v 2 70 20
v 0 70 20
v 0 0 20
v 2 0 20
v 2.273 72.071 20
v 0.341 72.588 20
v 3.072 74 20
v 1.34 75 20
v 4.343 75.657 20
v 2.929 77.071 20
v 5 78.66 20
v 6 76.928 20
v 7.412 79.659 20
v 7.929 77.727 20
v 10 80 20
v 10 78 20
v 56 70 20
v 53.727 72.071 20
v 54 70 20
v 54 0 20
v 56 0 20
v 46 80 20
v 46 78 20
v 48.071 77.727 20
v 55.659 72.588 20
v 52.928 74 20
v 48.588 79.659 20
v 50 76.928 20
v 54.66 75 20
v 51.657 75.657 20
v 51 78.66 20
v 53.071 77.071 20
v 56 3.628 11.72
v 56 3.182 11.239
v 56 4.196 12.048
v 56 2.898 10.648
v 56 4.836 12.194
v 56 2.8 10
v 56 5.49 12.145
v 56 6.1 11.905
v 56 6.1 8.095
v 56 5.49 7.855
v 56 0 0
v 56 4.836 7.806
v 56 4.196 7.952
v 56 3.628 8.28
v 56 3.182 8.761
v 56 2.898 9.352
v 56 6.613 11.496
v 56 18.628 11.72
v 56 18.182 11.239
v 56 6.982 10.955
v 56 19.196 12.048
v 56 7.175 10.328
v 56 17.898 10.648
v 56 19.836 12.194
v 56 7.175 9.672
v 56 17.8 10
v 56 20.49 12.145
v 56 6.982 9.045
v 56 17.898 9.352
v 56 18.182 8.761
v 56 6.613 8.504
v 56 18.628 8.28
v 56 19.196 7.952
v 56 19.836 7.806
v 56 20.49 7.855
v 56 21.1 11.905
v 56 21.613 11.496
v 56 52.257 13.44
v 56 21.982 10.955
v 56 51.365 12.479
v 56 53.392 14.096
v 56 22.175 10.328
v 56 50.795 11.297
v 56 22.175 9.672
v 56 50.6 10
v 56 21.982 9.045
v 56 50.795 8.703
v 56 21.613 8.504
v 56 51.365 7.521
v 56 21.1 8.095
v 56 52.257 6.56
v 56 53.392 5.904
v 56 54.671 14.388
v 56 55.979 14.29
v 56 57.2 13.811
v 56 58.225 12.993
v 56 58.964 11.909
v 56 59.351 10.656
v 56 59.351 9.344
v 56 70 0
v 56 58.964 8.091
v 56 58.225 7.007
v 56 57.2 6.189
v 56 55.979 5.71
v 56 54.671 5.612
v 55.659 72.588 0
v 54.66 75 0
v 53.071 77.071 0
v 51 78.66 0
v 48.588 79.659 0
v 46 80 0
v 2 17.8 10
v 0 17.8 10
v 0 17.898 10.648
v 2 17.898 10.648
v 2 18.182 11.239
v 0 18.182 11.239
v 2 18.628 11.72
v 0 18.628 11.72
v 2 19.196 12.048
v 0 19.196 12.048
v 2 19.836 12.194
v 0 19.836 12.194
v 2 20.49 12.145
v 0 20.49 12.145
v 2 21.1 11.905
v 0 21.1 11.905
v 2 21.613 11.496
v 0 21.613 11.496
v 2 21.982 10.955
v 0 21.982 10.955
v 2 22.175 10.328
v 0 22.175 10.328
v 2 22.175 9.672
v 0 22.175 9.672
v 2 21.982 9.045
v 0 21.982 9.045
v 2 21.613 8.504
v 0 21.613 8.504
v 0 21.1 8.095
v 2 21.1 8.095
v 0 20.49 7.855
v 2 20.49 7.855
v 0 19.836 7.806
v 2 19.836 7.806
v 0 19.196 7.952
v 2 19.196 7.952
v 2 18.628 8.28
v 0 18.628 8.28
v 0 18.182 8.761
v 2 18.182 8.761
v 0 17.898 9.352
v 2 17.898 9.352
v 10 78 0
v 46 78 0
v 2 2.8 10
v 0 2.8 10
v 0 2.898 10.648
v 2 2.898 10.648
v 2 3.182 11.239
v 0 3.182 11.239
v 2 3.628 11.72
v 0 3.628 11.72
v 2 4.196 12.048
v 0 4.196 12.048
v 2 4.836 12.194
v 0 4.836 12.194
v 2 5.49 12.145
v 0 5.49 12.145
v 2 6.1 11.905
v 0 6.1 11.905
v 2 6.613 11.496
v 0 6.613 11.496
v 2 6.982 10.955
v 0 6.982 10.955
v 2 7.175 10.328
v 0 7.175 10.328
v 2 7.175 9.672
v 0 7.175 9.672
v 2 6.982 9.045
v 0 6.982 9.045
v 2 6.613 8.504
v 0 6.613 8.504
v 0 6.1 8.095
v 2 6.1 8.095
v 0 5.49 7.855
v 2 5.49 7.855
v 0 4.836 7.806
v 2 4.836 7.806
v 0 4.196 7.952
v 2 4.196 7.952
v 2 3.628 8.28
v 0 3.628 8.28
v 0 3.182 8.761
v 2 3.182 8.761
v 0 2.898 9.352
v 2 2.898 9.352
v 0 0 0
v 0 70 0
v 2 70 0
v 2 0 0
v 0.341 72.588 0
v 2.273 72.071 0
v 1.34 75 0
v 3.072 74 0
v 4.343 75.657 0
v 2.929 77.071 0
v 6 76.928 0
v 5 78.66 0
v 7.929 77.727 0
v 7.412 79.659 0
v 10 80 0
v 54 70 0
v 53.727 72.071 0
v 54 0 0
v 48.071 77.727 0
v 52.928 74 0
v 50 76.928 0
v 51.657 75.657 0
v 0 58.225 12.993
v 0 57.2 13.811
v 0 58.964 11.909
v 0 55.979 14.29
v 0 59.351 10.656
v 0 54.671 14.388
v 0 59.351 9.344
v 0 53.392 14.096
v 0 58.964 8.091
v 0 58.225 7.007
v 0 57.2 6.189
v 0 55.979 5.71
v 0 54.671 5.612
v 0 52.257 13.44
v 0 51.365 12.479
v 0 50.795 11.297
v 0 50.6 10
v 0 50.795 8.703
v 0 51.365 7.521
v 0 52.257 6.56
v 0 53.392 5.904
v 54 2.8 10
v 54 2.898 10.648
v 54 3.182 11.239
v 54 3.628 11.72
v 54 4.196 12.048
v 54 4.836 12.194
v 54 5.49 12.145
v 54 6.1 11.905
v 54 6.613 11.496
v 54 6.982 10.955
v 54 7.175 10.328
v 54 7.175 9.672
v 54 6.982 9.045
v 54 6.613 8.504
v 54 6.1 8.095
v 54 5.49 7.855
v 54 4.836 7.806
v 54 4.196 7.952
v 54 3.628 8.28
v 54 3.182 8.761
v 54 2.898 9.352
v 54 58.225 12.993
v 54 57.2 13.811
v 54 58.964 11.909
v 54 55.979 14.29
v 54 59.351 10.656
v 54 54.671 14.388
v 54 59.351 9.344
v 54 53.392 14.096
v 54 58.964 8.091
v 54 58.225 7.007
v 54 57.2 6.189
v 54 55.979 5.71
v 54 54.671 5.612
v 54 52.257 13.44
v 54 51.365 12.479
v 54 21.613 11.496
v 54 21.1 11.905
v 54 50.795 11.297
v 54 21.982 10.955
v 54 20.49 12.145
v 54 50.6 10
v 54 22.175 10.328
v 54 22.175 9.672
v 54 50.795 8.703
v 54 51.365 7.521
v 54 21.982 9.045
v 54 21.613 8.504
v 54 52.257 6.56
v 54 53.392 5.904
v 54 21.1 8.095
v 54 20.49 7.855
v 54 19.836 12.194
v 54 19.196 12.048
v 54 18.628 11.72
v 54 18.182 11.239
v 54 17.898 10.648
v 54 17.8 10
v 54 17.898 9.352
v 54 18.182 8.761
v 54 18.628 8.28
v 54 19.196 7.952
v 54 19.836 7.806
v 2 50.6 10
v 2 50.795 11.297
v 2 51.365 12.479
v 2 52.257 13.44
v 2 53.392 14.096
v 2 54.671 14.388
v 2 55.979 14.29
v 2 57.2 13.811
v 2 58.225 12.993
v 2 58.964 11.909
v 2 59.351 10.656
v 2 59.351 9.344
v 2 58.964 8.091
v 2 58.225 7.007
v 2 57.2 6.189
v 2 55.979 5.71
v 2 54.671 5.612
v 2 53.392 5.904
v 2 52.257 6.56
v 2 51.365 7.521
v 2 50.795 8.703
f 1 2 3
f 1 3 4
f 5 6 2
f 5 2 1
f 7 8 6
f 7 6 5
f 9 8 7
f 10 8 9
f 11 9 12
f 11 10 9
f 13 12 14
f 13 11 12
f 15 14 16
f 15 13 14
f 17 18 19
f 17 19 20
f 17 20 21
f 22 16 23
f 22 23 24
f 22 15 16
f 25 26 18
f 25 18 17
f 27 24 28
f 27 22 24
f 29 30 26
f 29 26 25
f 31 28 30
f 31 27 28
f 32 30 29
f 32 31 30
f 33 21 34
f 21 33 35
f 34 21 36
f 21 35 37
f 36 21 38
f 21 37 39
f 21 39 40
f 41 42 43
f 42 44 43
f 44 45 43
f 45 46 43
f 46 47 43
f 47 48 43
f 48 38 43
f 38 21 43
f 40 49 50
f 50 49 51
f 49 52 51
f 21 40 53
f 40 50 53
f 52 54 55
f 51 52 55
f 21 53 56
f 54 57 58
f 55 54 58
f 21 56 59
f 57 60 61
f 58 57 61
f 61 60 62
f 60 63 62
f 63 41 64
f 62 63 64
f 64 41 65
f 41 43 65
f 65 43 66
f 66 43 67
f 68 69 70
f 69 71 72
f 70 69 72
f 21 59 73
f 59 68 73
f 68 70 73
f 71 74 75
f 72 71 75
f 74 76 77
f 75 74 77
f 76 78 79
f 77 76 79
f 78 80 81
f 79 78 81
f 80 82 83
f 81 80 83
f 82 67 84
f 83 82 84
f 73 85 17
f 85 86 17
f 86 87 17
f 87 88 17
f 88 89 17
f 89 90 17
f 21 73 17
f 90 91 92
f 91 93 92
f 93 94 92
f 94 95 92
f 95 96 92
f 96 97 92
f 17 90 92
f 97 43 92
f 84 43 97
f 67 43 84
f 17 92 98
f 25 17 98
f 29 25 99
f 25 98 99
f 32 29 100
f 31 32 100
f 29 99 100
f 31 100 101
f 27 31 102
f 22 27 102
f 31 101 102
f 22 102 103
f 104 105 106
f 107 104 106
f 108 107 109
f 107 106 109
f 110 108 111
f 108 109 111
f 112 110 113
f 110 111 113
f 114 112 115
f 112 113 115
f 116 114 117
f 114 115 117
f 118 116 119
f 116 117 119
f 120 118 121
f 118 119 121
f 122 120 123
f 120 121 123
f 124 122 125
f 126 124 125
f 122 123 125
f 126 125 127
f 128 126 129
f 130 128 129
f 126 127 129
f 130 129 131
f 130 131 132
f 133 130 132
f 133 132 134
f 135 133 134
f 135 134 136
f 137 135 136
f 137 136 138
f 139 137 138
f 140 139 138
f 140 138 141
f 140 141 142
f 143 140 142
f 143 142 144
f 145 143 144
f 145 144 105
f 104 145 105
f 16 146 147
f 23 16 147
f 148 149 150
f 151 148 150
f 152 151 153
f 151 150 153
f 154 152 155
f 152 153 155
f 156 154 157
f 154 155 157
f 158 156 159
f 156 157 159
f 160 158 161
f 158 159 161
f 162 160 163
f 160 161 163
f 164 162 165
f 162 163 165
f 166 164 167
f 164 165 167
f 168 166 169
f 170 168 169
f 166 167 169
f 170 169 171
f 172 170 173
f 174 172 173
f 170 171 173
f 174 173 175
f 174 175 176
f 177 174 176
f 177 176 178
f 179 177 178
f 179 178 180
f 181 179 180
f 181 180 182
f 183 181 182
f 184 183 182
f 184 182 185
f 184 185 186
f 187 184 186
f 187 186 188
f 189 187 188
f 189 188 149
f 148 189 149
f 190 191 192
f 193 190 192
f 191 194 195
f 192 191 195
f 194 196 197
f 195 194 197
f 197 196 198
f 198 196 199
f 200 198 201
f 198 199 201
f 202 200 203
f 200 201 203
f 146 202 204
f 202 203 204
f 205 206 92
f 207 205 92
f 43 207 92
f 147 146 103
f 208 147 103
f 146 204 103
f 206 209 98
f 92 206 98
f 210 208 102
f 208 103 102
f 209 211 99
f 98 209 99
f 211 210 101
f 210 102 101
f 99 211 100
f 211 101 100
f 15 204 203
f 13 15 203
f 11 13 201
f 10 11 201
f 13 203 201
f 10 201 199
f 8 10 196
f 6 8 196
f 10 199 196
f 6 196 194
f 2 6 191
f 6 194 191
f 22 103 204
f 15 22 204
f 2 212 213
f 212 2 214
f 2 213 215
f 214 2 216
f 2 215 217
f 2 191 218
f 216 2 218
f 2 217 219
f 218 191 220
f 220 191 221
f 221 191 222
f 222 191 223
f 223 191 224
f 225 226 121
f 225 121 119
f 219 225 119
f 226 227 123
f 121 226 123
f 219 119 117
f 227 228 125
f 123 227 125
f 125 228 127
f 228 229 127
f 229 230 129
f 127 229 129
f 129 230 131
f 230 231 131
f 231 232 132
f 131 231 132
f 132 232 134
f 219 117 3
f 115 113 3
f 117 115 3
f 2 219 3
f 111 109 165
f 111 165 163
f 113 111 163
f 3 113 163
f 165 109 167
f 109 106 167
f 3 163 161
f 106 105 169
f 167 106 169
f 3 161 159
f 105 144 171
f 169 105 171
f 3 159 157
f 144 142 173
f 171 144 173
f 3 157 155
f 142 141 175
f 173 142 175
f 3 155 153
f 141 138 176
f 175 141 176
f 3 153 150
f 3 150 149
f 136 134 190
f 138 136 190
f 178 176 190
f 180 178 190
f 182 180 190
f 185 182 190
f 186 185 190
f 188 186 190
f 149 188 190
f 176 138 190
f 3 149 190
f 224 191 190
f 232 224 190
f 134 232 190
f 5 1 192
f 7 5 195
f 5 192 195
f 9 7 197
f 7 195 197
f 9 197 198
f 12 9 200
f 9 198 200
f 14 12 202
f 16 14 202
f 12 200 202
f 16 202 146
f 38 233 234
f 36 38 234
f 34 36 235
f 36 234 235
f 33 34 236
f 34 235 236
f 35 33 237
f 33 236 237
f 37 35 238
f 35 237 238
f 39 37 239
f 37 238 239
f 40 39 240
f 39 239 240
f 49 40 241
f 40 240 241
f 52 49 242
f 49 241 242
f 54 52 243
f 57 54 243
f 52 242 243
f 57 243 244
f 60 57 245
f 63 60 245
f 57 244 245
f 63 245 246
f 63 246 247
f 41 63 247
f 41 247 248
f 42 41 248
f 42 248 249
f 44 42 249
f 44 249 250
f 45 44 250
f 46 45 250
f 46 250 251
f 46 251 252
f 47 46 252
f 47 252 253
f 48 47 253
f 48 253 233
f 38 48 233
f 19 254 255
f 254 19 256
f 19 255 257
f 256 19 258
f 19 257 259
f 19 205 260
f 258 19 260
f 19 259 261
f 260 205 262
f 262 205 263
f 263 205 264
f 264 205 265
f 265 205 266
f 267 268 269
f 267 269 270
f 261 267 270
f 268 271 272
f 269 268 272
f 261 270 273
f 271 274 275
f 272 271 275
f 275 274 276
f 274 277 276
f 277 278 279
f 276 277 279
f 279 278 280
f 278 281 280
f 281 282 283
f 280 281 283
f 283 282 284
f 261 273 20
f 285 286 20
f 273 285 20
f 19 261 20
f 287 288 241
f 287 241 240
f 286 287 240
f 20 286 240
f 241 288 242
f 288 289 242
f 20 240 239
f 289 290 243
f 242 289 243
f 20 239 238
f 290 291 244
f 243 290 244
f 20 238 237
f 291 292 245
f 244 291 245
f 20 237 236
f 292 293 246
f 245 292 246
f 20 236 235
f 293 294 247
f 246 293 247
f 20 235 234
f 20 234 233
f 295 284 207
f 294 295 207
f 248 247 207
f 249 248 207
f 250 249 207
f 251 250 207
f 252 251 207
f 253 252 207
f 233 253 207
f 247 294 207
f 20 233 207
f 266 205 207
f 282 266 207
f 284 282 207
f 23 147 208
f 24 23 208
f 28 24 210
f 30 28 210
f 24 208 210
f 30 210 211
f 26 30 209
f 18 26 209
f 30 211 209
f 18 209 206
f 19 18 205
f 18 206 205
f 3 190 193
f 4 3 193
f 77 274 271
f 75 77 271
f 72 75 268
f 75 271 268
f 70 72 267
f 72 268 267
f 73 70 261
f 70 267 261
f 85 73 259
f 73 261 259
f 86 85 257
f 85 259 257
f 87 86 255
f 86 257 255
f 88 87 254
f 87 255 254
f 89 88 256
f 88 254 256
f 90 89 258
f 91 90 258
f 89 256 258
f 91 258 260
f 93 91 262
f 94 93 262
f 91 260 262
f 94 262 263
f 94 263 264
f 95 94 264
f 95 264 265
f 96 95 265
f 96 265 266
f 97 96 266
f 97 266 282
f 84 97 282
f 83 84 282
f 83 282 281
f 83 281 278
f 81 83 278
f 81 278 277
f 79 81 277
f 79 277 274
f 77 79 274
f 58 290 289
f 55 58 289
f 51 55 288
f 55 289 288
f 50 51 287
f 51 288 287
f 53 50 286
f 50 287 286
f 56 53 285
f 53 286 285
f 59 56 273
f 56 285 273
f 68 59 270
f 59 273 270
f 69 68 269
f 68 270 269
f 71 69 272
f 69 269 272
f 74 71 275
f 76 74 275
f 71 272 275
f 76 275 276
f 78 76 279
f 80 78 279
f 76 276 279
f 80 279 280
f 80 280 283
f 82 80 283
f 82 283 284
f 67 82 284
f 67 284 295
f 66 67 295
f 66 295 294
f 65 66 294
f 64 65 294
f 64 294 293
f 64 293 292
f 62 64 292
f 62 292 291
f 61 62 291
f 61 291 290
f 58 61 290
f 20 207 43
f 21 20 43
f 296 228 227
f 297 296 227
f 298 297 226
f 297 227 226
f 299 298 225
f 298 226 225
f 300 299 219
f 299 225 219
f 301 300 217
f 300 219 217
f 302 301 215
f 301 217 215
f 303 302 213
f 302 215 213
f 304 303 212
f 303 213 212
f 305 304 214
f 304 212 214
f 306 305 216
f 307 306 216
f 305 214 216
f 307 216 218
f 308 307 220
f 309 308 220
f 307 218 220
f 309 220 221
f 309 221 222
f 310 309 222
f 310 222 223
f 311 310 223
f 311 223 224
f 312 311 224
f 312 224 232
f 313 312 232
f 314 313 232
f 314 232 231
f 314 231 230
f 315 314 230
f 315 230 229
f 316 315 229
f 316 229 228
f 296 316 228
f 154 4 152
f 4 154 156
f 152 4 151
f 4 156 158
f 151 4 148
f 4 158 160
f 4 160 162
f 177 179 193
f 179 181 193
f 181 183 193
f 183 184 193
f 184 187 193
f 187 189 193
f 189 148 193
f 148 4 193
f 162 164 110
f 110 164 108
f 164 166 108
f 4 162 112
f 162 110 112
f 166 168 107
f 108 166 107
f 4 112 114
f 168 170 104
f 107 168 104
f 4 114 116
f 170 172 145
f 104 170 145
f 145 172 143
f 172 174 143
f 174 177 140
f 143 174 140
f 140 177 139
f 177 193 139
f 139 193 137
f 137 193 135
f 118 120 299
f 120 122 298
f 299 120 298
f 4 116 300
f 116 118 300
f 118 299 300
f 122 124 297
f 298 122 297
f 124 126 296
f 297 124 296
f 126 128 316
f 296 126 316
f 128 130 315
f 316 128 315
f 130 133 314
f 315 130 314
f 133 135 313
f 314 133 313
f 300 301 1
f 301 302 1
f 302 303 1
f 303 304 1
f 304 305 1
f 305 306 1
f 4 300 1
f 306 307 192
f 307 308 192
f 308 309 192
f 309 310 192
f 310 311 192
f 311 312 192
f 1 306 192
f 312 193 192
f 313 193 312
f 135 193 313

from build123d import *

# Parameters (mm, degrees)
F1_DEPTH = 20
F3_D     = 8.8
F5_D     = 4.4


with BuildPart() as f1:
    # F0 (on Top) → F1 (new body)
    with BuildSketch(Plane.XY):
        with BuildLine():
            Line((0, 70), (0, 0))
            Line((0, 0), (2, 0))
            Line((2, 0), (2, 70))
            ThreePointArc((2, 70), (4.3431457505, 75.6568542495), (10, 78))
            Line((10, 78), (46, 78))
            ThreePointArc((46, 78), (51.6568542495, 75.6568542495), (54, 70))
            Line((54, 70), (54, 0))
            Line((54, 0), (56, 0))
            Line((56, 0), (56, 70))
            ThreePointArc((56, 70), (53.0710678119, 77.0710678119), (46, 80))
            Line((46, 80), (10, 80))
            ThreePointArc((10, 80), (2.9289321881, 77.0710678119), (0, 70))
        make_face()
    extrude(amount=F1_DEPTH)

    # F3 (through all)
    with Locations(Plane.YZ.offset(56)):
        with Locations((55, 10)):
            Hole(F3_D / 2)

    # F5 (through all)
    with Locations(Plane.YZ.offset(56)):
        with Locations((5, 10), (20, 10)):
            Hole(F5_D / 2)


solid = f1.part
